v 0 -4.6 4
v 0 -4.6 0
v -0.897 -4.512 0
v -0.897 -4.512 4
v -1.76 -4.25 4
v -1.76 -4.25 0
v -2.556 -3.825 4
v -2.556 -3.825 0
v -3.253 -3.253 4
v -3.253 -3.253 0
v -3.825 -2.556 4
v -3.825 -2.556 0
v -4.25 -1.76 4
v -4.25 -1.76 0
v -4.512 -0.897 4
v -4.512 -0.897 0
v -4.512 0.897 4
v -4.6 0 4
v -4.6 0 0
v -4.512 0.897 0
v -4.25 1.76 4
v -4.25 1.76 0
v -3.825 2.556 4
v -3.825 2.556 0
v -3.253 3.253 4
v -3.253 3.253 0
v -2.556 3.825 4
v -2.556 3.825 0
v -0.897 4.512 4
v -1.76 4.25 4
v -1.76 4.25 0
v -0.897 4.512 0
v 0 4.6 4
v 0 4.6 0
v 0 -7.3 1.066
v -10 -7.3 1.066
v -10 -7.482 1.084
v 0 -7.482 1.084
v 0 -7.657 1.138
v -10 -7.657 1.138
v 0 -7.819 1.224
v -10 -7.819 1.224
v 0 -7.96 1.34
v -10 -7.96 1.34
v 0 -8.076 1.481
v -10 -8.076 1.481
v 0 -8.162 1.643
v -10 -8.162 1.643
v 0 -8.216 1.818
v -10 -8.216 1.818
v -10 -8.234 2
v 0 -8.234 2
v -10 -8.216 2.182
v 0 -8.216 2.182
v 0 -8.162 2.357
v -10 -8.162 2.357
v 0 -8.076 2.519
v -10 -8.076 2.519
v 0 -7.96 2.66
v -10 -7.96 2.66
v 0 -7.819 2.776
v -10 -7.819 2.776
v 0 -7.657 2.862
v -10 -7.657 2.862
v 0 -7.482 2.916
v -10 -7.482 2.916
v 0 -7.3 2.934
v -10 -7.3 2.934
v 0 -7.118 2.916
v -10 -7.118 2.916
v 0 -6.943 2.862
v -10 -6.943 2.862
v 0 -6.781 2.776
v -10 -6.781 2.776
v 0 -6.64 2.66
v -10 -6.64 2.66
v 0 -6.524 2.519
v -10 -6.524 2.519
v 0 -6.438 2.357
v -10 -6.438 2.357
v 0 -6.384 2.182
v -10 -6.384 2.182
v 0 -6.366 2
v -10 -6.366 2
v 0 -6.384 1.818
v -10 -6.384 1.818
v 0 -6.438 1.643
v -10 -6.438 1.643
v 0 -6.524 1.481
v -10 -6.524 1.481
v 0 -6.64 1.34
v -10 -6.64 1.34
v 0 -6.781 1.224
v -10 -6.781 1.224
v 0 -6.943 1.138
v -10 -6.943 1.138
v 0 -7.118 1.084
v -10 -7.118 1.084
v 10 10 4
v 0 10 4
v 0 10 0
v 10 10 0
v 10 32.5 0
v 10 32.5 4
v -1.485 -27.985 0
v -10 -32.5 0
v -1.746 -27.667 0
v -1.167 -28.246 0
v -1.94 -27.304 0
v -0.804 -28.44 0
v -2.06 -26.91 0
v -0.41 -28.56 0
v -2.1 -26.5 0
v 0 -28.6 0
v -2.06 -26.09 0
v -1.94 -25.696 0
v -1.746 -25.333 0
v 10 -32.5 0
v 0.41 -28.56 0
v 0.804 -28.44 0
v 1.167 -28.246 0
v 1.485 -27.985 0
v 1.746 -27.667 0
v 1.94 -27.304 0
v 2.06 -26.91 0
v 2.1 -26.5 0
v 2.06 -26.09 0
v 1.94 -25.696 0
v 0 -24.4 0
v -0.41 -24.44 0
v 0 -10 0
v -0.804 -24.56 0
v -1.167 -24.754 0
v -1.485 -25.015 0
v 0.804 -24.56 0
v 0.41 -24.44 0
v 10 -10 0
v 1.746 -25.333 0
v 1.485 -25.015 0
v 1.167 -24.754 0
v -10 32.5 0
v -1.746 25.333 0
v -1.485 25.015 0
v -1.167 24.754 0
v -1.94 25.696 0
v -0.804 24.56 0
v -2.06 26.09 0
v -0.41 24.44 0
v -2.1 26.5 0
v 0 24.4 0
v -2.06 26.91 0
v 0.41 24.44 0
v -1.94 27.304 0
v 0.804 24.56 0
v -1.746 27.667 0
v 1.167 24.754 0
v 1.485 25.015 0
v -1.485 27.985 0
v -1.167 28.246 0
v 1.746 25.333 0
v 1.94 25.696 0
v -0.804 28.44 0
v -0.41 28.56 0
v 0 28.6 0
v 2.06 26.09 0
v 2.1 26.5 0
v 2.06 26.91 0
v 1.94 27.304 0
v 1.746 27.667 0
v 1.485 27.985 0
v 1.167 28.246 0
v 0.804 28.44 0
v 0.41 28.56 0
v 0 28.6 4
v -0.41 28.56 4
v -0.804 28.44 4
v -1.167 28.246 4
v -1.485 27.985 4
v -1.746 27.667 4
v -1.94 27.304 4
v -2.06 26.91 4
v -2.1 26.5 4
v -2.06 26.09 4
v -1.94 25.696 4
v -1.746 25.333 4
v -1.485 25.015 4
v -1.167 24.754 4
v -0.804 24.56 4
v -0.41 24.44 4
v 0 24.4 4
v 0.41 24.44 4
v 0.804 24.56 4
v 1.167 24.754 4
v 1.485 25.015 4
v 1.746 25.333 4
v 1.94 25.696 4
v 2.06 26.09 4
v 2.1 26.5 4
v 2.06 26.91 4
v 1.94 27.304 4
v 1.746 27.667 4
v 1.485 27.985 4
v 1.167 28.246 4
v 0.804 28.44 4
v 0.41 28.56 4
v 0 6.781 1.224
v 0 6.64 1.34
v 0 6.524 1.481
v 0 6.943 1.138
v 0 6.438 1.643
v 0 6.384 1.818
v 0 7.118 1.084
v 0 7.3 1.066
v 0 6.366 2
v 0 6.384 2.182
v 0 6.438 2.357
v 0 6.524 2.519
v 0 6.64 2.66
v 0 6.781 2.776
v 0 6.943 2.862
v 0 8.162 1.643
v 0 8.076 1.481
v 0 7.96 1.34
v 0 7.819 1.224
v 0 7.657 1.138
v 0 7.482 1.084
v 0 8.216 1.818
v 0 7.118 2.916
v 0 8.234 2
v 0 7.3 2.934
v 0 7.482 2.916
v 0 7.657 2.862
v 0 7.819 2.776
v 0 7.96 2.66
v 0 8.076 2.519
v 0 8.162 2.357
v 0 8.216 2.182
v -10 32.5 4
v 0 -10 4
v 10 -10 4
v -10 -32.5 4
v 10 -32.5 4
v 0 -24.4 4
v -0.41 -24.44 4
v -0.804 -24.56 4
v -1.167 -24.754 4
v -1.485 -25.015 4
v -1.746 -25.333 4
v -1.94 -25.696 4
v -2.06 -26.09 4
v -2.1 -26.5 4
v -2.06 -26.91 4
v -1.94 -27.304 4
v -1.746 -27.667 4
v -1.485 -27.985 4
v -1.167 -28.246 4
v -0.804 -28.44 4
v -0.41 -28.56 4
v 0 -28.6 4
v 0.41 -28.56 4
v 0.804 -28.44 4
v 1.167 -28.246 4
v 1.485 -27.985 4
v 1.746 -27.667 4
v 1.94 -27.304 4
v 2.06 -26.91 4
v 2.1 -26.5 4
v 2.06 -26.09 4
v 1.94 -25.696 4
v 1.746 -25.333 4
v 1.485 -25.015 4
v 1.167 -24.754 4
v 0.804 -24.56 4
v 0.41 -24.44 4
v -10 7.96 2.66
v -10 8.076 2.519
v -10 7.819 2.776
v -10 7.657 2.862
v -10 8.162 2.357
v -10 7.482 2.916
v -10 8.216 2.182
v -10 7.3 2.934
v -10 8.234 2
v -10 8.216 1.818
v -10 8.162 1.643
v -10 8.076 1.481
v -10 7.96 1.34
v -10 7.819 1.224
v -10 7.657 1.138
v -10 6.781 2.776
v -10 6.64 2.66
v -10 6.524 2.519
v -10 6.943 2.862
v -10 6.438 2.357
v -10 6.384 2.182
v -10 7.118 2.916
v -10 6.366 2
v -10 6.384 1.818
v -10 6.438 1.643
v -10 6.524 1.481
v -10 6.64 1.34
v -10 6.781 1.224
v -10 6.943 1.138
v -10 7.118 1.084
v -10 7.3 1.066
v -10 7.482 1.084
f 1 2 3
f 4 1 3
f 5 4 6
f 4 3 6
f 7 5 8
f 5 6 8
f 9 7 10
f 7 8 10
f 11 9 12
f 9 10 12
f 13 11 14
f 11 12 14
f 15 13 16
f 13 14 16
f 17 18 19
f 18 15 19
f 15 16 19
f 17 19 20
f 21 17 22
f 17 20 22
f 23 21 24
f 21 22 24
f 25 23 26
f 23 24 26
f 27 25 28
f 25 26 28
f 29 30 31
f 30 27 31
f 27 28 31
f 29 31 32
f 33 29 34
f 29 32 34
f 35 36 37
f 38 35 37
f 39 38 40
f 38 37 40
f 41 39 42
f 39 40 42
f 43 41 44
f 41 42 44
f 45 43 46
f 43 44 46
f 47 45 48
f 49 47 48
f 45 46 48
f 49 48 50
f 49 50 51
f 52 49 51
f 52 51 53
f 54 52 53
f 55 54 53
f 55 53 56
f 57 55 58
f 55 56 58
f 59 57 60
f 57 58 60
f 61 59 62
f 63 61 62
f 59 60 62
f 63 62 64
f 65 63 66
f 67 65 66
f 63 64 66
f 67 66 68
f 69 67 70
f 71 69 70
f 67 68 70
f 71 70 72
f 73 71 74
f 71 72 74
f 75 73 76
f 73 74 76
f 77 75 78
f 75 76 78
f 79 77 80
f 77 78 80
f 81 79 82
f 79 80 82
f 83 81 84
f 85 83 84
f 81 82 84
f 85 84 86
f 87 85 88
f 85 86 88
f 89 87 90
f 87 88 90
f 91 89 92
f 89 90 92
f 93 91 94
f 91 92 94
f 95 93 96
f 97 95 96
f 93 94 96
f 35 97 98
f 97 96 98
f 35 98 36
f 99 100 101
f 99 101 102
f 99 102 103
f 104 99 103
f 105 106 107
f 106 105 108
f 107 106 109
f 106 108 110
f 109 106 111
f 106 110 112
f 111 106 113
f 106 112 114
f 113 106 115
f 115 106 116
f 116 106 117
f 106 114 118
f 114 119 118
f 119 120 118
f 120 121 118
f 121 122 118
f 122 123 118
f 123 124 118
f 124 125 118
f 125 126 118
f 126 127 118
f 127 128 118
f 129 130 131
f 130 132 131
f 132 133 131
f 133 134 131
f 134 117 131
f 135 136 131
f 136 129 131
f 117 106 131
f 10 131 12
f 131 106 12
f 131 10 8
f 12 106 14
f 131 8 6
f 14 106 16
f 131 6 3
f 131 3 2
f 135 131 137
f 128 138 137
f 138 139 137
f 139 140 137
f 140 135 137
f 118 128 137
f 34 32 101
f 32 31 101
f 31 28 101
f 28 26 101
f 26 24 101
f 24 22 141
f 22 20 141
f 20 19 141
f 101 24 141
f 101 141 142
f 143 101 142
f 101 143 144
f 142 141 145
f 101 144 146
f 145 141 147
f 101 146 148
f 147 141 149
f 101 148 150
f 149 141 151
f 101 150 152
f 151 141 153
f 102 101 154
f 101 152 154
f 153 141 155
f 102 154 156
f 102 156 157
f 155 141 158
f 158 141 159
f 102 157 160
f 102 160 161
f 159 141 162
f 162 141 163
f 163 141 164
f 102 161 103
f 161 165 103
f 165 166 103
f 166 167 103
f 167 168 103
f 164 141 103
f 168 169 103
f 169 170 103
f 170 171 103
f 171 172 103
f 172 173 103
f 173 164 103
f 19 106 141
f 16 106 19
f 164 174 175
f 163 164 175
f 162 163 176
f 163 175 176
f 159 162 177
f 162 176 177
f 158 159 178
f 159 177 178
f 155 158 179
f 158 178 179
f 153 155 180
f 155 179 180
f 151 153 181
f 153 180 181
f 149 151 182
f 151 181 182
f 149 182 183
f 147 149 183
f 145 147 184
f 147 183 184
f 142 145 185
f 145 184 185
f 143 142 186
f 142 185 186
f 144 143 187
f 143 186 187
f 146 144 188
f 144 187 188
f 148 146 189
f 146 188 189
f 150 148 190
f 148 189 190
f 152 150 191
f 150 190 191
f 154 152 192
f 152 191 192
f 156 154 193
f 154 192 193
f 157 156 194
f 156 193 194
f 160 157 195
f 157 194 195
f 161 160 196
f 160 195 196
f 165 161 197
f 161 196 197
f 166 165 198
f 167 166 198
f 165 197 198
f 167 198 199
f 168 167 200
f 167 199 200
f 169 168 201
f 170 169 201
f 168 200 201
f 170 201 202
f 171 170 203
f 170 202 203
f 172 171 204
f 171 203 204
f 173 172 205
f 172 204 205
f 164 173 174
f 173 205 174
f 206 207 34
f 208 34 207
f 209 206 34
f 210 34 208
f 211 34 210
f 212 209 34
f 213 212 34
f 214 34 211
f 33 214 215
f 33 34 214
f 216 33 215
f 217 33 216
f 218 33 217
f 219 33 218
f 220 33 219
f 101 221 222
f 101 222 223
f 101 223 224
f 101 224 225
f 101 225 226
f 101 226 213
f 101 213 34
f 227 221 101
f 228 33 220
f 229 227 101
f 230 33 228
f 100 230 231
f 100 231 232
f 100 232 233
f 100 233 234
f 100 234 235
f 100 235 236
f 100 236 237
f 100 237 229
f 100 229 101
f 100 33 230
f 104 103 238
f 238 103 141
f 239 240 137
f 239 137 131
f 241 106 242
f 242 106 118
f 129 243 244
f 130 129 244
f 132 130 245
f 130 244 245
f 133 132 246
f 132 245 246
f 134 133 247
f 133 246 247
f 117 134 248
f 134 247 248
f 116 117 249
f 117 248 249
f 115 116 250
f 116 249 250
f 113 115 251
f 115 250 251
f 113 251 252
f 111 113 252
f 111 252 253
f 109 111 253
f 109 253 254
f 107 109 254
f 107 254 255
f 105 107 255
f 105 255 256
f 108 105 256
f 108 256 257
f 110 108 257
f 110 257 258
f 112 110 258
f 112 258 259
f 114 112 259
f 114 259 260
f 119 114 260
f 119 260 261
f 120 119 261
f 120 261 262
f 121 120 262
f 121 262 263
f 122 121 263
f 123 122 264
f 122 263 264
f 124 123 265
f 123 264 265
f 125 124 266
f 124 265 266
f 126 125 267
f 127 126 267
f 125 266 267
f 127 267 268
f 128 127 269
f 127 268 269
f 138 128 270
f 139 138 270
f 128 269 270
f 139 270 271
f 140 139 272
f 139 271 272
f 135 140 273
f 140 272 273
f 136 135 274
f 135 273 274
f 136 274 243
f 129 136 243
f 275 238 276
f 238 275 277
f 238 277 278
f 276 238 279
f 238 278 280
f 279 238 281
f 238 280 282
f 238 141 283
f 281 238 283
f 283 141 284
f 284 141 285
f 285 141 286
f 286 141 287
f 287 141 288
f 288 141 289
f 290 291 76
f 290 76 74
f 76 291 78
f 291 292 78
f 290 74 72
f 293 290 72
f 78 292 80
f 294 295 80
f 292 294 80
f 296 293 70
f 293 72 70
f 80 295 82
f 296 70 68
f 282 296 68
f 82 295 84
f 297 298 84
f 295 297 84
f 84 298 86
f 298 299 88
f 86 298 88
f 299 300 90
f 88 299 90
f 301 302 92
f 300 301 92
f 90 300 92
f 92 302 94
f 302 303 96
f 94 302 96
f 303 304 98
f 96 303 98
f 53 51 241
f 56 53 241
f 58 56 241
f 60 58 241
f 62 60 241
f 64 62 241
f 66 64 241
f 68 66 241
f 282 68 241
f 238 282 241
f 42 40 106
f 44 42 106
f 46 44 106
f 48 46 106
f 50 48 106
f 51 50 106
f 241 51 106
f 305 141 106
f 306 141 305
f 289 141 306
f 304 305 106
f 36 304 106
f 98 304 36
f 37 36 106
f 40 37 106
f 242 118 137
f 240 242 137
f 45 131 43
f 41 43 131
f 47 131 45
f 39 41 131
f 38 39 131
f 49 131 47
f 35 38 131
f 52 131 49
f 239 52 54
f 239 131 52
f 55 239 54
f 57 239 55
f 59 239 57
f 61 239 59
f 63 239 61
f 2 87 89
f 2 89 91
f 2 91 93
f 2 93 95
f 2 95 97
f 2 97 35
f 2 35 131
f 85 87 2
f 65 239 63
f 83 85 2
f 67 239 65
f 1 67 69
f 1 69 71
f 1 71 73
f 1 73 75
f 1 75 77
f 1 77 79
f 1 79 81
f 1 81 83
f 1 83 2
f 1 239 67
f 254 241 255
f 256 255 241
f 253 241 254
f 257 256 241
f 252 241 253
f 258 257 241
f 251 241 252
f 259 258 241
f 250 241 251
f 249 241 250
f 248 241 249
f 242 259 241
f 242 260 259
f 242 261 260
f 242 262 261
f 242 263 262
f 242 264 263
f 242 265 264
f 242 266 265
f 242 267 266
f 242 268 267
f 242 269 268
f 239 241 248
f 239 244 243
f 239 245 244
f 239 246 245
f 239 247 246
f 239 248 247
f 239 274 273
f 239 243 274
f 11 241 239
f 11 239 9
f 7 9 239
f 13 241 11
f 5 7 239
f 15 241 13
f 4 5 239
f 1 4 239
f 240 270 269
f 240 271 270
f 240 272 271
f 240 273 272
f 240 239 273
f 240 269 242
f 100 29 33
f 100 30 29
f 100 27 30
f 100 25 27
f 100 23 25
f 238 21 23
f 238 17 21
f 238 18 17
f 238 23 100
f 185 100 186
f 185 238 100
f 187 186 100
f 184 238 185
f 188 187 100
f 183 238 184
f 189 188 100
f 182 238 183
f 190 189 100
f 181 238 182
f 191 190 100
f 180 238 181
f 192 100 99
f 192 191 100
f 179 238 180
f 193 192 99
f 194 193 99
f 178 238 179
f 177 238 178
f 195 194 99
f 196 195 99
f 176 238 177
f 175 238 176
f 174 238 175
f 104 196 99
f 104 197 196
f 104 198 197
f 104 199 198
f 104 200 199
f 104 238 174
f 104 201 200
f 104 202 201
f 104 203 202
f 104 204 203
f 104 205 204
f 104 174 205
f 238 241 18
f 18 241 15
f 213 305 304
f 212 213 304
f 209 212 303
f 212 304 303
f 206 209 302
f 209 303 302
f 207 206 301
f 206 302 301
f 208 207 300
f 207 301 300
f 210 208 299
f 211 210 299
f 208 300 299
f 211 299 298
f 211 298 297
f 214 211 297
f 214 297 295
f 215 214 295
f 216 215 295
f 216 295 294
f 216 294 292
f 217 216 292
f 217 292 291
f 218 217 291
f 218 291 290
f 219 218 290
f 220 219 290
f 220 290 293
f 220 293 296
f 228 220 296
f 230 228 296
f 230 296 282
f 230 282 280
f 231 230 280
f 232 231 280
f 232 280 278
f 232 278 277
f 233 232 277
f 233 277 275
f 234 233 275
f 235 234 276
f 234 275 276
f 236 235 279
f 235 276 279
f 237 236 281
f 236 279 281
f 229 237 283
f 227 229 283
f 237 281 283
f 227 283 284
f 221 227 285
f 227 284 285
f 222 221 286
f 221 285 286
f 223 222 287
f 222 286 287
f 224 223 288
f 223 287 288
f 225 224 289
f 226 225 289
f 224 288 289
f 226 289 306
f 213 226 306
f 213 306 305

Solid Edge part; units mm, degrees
sketch "Sketch1" plane through (0, 0, 0) normal (0, 0, 1) x (1, 0, 0)
  line L0 (-10, -32.5) -> (10, -32.5)
  line L1 (10, -32.5) -> (10, 32.5)
  line L2 (10, 32.5) -> (-10, 32.5)
  line L3 (-10, 32.5) -> (-10, -32.5)
  circle A0 centre (0, 0) radius 4.6
  dimension "D1" = 65
  dimension "D2" = 20
extrude "Protrusion1" add sketch "Sketch1" along normal blind 4
sketch "Sketch2" plane through (0, 0, 4) normal (0, 0, 1) x (1, 0, 0)
  line L0 (0, 10) -> (10, 10)
  line L1 (10, 10) -> (10, -10)
  line L2 (10, -10) -> (0, -10)
  line L3 (0, -10) -> (0, 10)
  dimension "D1" = 20
  dimension "D2" = 10
extrude "Cutout1" cut sketch "Sketch2" against normal up to next
sketch "Sketch3" plane through (0, 0, 4) normal (0, 0, 1) x (0, 1, 0)
  circle A0 centre (26.5, 0) radius 2.1
  circle A1 centre (-26.5, 0) radius 2.1
  dimension "D1" = 53
  dimension "D2" = 26.5
extrude "Cutout2" cut sketch "Sketch3" against normal up to next
hole "Hole_1" at (0, 7.3, 2) direction (-1, 0, 0) diameter 1.867 depth 10 thread major 2.3 thread length 8
hole "Hole1" at (0, -7.3, 2) direction (-1, 0, 0) diameter 1.867 depth 10 thread major 2.3 thread length 8
